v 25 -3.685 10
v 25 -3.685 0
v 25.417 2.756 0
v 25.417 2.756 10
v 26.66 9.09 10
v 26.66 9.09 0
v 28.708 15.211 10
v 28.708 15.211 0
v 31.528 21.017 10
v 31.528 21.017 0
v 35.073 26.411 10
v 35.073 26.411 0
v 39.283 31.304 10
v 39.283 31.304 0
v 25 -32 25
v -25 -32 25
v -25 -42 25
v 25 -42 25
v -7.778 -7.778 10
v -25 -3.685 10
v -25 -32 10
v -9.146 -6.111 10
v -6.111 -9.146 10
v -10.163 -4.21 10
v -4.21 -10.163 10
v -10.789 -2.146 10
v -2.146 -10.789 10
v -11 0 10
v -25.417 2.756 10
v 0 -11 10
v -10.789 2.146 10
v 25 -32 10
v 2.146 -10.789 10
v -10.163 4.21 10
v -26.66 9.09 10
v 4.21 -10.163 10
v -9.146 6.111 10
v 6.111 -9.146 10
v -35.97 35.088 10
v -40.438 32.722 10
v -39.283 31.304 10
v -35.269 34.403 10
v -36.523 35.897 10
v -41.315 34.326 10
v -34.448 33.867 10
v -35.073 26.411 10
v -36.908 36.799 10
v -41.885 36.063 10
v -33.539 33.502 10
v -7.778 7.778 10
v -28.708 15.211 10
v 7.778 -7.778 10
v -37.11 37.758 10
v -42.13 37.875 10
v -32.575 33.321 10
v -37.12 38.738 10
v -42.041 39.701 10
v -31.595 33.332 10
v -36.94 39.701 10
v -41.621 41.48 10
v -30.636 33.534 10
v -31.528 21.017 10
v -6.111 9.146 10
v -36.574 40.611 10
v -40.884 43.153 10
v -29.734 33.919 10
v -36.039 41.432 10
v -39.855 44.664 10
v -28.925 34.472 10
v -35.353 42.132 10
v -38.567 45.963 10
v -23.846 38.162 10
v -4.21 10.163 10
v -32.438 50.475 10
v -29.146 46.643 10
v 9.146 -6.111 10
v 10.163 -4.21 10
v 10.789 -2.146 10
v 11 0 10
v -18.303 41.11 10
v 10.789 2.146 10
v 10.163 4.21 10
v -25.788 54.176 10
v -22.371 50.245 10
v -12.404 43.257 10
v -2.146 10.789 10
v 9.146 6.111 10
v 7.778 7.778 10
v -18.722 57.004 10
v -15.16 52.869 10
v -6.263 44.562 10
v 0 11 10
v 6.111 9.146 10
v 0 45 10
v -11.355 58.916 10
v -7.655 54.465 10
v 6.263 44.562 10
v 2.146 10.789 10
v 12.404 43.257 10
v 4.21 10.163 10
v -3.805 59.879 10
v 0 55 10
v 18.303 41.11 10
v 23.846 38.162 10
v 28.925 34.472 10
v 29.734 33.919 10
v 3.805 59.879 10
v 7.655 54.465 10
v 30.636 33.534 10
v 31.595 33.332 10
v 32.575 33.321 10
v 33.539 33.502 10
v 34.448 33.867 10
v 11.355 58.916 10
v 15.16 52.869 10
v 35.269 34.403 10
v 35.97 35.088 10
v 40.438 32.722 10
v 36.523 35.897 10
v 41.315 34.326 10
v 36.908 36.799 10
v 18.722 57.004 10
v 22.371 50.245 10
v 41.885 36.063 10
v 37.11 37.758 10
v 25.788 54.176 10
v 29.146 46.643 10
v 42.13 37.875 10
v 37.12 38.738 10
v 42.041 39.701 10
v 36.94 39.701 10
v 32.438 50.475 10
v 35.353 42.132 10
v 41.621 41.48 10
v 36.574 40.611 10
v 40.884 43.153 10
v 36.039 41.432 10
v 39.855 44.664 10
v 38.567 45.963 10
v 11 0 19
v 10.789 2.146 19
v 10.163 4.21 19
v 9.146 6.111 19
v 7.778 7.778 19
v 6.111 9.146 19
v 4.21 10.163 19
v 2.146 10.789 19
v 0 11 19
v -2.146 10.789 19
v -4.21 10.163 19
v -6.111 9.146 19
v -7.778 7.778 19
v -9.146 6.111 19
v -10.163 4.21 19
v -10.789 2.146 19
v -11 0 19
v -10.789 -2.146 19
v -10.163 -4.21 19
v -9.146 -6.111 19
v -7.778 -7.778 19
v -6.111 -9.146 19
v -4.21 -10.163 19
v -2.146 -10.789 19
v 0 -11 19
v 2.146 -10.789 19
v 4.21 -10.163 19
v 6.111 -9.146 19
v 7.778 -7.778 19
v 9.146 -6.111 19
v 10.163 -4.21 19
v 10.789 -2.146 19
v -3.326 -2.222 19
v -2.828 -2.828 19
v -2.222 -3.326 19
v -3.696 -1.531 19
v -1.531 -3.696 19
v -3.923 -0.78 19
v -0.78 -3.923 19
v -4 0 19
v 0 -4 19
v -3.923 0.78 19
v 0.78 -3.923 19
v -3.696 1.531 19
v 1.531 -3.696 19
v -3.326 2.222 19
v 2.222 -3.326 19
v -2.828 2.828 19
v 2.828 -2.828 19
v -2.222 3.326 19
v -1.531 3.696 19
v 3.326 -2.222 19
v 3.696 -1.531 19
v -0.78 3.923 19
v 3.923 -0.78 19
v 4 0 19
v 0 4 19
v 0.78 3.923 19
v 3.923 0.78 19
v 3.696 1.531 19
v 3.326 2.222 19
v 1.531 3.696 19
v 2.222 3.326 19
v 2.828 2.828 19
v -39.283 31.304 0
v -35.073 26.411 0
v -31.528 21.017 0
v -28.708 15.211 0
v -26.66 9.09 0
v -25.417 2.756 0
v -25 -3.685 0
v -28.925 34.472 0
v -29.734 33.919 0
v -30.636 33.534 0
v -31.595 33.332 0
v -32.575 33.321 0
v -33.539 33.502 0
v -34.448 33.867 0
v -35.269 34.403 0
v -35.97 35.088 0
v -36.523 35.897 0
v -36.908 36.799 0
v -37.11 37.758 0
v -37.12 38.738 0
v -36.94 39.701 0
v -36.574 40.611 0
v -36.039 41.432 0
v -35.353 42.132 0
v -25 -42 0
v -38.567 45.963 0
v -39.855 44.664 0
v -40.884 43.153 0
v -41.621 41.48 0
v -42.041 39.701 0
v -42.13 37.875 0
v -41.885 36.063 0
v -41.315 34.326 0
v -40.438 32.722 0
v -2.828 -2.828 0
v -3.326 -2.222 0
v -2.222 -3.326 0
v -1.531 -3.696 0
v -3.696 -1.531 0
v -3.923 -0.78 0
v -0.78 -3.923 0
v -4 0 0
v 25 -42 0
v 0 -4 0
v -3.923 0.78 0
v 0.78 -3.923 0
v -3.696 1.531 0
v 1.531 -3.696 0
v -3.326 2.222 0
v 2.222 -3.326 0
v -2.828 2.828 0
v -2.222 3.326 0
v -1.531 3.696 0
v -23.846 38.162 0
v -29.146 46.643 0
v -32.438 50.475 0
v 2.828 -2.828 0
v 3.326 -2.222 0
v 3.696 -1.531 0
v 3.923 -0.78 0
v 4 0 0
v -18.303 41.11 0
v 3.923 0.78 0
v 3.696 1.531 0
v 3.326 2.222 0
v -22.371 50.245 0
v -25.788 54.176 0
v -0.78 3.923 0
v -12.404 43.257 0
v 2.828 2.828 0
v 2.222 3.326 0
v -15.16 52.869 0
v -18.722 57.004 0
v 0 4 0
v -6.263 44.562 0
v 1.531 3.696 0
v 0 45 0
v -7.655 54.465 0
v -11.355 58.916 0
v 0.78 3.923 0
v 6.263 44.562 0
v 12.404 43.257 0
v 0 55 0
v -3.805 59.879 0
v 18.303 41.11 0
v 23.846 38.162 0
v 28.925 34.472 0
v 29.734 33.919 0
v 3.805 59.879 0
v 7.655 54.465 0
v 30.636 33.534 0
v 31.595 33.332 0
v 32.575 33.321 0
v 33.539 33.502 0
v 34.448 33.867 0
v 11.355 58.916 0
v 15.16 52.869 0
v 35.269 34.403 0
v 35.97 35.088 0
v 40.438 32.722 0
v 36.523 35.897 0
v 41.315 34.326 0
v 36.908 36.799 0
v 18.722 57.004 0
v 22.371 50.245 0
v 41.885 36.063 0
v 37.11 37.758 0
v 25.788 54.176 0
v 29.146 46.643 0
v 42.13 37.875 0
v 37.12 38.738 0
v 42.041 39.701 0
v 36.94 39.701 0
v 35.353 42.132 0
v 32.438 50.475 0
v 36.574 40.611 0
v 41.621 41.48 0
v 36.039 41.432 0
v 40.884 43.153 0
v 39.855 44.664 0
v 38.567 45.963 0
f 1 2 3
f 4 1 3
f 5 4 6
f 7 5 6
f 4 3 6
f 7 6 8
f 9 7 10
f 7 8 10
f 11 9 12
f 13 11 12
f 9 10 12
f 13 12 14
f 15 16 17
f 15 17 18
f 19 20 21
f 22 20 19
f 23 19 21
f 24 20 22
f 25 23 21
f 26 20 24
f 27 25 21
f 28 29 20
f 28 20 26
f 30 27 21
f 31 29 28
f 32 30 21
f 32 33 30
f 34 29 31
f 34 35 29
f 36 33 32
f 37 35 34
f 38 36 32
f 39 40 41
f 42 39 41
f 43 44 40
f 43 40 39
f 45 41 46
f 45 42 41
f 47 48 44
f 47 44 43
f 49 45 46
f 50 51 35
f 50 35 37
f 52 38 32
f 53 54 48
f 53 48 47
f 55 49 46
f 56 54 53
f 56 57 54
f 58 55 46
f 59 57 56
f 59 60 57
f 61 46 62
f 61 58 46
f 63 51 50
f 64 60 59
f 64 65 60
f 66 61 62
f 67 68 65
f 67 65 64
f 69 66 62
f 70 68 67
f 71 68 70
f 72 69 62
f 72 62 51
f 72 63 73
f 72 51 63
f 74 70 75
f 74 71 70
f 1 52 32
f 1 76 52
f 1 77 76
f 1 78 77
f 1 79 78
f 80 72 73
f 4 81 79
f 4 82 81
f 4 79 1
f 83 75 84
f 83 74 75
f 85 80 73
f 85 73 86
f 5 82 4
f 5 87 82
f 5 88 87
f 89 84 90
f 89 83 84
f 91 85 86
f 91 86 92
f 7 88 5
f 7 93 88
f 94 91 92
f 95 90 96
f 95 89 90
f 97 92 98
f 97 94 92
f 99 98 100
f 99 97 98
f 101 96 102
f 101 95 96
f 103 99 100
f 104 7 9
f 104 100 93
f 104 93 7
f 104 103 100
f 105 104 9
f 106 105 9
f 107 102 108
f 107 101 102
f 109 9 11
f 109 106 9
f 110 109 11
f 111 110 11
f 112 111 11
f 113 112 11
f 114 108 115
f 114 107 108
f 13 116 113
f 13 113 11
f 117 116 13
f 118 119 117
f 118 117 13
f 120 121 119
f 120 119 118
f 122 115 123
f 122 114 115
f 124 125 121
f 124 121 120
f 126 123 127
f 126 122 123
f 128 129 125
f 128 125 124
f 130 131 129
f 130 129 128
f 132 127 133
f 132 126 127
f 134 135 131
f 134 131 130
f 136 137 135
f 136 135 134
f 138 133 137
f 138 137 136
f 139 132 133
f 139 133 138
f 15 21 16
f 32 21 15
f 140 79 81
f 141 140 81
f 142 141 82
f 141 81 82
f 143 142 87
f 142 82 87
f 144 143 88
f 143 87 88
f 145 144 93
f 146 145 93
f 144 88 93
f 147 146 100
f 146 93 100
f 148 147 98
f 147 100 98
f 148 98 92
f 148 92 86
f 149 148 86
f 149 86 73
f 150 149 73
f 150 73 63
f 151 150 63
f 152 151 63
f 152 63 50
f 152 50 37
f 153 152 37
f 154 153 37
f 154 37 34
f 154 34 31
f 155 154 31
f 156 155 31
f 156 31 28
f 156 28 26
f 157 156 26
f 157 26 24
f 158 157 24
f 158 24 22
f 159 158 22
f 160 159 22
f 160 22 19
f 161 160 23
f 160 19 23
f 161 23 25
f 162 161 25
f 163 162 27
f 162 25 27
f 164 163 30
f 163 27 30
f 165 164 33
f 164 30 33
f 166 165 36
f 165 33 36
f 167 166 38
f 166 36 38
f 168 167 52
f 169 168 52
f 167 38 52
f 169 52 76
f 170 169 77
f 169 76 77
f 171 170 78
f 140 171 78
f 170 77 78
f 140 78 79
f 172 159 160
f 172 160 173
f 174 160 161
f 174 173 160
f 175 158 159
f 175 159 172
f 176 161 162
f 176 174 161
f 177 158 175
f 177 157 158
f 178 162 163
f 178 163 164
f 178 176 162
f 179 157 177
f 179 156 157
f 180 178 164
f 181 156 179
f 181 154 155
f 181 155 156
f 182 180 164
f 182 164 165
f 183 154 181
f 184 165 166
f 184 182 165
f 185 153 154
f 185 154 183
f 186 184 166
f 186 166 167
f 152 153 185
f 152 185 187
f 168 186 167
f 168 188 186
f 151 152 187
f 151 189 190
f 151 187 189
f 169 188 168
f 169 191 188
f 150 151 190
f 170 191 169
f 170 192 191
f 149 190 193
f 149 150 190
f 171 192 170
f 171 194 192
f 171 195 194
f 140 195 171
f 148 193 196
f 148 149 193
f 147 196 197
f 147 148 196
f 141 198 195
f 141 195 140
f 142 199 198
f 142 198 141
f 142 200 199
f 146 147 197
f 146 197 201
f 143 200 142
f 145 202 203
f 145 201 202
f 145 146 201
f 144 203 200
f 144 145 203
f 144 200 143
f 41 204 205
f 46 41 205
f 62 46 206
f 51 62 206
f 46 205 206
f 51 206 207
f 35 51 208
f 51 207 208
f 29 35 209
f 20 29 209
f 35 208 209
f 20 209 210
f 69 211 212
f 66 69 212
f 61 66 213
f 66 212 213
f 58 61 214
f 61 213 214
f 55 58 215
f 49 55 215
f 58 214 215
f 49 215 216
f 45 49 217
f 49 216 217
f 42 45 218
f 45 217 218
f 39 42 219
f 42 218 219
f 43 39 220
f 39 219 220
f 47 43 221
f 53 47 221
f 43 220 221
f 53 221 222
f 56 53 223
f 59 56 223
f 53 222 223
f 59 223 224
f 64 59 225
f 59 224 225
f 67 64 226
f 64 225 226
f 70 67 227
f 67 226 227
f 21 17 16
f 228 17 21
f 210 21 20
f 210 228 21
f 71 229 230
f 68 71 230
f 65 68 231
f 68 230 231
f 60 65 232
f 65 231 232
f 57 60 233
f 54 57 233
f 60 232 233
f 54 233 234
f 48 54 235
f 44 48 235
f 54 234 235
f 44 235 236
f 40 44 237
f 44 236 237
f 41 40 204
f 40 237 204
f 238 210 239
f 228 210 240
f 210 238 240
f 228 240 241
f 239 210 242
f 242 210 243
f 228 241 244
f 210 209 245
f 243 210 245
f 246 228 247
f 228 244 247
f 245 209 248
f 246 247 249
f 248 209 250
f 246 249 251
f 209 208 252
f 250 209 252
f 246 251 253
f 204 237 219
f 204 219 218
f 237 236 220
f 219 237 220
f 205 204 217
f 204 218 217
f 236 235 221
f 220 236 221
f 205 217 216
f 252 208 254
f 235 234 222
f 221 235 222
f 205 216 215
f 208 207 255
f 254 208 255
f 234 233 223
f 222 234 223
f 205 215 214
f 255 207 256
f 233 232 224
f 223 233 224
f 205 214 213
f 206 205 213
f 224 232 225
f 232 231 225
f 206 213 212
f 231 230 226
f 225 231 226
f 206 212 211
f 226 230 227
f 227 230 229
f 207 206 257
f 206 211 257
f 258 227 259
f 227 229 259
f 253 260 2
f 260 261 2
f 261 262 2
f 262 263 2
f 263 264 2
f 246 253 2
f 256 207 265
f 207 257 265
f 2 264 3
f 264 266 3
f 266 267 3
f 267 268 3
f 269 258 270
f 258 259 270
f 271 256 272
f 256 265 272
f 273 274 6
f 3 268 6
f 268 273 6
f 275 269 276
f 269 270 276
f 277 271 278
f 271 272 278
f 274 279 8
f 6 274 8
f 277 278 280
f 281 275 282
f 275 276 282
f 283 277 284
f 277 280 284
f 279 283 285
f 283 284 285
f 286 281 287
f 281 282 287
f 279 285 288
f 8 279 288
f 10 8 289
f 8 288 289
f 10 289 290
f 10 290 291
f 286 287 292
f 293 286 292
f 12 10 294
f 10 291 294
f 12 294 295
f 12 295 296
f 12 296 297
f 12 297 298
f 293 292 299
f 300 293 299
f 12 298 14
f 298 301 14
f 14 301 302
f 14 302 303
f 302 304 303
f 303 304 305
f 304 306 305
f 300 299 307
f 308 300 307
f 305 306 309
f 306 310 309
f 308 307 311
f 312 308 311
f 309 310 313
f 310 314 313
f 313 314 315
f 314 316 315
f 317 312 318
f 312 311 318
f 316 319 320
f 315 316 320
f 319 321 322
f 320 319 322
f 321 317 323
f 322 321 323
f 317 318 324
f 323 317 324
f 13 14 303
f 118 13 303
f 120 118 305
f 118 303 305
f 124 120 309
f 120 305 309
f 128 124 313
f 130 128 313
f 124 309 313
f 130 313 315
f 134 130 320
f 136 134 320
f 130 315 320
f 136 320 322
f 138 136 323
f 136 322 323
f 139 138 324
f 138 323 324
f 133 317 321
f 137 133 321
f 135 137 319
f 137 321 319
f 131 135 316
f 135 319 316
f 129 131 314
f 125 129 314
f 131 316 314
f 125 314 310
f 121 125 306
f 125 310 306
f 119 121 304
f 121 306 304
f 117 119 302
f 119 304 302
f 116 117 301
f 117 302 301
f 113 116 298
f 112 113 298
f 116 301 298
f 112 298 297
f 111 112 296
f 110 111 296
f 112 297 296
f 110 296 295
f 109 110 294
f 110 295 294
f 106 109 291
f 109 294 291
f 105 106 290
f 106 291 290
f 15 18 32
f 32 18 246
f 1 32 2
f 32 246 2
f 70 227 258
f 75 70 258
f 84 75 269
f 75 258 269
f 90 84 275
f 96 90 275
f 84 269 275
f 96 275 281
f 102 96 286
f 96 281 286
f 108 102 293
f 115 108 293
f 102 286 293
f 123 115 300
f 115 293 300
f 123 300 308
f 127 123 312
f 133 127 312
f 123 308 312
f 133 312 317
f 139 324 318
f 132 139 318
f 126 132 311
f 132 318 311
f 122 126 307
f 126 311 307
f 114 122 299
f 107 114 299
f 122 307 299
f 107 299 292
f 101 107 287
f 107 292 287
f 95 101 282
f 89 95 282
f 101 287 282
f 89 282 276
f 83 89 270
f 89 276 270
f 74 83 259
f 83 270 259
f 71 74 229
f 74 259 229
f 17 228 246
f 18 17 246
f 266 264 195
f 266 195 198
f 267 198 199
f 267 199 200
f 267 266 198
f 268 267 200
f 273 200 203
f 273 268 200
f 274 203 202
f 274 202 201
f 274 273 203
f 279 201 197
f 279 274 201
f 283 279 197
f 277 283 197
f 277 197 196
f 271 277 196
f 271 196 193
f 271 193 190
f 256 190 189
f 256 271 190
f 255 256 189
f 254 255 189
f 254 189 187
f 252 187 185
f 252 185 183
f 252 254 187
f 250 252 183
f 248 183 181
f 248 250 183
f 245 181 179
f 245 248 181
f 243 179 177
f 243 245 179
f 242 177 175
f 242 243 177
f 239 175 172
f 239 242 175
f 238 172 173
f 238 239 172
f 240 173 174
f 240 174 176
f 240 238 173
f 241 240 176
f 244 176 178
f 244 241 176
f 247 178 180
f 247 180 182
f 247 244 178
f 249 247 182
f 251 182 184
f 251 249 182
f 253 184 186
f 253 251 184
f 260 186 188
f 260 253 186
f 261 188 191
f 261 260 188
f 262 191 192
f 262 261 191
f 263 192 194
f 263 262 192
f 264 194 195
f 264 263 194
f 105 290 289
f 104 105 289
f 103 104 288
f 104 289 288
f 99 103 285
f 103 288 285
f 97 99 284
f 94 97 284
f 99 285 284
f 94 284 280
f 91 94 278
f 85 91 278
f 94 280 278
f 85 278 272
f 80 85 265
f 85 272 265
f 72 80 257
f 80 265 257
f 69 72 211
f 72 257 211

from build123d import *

# Parameters (mm, degrees)
SKETCH1_R           = 11
BOSS_EXTRUDE1_DEPTH = 10
SKETCH1_3_W         = 50
SKETCH1_3_H         = 10
BOSS_EXTRUDE2_DEPTH = 25
SKETCH1_4_R         = 11
SKETCH1_4_R_2       = 4
BOSS_EXTRUDE3_DEPTH = 19


with BuildPart() as part:
    # Sketch1 → Boss-Extrude1 (new body)
    with BuildSketch(Plane.XY):
        with BuildLine():
            Line((-25, -3.685481934), (-25, -32))
            Line((-25, -32), (25, -32))
            Line((25, -32), (25, -3.685481934))
            ThreePointArc((25, -3.685481934), (28.70821268, 15.210825292), (39.28281707, 31.304271474))
            ThreePointArc((39.28281707, 31.304271474), (42.127486852, 38.789799017), (38.567256581, 45.962666587))
            ThreePointArc((38.567256581, 45.962666587), (0, 60), (-38.567256581, 45.962666587))
            ThreePointArc((-38.567256581, 45.962666587), (-42.127486852, 38.789799017), (-39.28281707, 31.304271474))
            ThreePointArc((-39.28281707, 31.304271474), (-28.70821268, 15.210825292), (-25, -3.685481934))
        make_face()
        Circle(SKETCH1_R, mode=Mode.SUBTRACT)
        with BuildLine():
            ThreePointArc((-28.925442436, 34.47199994), (-35.9696027, 35.088284108), (-35.353318533, 42.132444372))
            ThreePointArc((-35.353318533, 42.132444372), (0, 55), (35.353318533, 42.132444372))
            ThreePointArc((35.353318533, 42.132444372), (35.9696027, 35.088284108), (28.925442436, 34.47199994))
            ThreePointArc((28.925442436, 34.47199994), (0, 45), (-28.925442436, 34.47199994))
        make_face(mode=Mode.SUBTRACT)
    extrude(amount=BOSS_EXTRUDE1_DEPTH)

    # Sketch1<3> → Boss-Extrude2 (add)
    with BuildSketch(Plane.XY):
        with Locations((0, -37)):
            Rectangle(SKETCH1_3_W, SKETCH1_3_H)
    extrude(amount=BOSS_EXTRUDE2_DEPTH)

    # Sketch1<4> → Boss-Extrude3 (add)
    with BuildSketch(Plane.XY):
        Circle(SKETCH1_4_R)
        Circle(SKETCH1_4_R_2, mode=Mode.SUBTRACT)
    extrude(amount=BOSS_EXTRUDE3_DEPTH)


solid = part.part
